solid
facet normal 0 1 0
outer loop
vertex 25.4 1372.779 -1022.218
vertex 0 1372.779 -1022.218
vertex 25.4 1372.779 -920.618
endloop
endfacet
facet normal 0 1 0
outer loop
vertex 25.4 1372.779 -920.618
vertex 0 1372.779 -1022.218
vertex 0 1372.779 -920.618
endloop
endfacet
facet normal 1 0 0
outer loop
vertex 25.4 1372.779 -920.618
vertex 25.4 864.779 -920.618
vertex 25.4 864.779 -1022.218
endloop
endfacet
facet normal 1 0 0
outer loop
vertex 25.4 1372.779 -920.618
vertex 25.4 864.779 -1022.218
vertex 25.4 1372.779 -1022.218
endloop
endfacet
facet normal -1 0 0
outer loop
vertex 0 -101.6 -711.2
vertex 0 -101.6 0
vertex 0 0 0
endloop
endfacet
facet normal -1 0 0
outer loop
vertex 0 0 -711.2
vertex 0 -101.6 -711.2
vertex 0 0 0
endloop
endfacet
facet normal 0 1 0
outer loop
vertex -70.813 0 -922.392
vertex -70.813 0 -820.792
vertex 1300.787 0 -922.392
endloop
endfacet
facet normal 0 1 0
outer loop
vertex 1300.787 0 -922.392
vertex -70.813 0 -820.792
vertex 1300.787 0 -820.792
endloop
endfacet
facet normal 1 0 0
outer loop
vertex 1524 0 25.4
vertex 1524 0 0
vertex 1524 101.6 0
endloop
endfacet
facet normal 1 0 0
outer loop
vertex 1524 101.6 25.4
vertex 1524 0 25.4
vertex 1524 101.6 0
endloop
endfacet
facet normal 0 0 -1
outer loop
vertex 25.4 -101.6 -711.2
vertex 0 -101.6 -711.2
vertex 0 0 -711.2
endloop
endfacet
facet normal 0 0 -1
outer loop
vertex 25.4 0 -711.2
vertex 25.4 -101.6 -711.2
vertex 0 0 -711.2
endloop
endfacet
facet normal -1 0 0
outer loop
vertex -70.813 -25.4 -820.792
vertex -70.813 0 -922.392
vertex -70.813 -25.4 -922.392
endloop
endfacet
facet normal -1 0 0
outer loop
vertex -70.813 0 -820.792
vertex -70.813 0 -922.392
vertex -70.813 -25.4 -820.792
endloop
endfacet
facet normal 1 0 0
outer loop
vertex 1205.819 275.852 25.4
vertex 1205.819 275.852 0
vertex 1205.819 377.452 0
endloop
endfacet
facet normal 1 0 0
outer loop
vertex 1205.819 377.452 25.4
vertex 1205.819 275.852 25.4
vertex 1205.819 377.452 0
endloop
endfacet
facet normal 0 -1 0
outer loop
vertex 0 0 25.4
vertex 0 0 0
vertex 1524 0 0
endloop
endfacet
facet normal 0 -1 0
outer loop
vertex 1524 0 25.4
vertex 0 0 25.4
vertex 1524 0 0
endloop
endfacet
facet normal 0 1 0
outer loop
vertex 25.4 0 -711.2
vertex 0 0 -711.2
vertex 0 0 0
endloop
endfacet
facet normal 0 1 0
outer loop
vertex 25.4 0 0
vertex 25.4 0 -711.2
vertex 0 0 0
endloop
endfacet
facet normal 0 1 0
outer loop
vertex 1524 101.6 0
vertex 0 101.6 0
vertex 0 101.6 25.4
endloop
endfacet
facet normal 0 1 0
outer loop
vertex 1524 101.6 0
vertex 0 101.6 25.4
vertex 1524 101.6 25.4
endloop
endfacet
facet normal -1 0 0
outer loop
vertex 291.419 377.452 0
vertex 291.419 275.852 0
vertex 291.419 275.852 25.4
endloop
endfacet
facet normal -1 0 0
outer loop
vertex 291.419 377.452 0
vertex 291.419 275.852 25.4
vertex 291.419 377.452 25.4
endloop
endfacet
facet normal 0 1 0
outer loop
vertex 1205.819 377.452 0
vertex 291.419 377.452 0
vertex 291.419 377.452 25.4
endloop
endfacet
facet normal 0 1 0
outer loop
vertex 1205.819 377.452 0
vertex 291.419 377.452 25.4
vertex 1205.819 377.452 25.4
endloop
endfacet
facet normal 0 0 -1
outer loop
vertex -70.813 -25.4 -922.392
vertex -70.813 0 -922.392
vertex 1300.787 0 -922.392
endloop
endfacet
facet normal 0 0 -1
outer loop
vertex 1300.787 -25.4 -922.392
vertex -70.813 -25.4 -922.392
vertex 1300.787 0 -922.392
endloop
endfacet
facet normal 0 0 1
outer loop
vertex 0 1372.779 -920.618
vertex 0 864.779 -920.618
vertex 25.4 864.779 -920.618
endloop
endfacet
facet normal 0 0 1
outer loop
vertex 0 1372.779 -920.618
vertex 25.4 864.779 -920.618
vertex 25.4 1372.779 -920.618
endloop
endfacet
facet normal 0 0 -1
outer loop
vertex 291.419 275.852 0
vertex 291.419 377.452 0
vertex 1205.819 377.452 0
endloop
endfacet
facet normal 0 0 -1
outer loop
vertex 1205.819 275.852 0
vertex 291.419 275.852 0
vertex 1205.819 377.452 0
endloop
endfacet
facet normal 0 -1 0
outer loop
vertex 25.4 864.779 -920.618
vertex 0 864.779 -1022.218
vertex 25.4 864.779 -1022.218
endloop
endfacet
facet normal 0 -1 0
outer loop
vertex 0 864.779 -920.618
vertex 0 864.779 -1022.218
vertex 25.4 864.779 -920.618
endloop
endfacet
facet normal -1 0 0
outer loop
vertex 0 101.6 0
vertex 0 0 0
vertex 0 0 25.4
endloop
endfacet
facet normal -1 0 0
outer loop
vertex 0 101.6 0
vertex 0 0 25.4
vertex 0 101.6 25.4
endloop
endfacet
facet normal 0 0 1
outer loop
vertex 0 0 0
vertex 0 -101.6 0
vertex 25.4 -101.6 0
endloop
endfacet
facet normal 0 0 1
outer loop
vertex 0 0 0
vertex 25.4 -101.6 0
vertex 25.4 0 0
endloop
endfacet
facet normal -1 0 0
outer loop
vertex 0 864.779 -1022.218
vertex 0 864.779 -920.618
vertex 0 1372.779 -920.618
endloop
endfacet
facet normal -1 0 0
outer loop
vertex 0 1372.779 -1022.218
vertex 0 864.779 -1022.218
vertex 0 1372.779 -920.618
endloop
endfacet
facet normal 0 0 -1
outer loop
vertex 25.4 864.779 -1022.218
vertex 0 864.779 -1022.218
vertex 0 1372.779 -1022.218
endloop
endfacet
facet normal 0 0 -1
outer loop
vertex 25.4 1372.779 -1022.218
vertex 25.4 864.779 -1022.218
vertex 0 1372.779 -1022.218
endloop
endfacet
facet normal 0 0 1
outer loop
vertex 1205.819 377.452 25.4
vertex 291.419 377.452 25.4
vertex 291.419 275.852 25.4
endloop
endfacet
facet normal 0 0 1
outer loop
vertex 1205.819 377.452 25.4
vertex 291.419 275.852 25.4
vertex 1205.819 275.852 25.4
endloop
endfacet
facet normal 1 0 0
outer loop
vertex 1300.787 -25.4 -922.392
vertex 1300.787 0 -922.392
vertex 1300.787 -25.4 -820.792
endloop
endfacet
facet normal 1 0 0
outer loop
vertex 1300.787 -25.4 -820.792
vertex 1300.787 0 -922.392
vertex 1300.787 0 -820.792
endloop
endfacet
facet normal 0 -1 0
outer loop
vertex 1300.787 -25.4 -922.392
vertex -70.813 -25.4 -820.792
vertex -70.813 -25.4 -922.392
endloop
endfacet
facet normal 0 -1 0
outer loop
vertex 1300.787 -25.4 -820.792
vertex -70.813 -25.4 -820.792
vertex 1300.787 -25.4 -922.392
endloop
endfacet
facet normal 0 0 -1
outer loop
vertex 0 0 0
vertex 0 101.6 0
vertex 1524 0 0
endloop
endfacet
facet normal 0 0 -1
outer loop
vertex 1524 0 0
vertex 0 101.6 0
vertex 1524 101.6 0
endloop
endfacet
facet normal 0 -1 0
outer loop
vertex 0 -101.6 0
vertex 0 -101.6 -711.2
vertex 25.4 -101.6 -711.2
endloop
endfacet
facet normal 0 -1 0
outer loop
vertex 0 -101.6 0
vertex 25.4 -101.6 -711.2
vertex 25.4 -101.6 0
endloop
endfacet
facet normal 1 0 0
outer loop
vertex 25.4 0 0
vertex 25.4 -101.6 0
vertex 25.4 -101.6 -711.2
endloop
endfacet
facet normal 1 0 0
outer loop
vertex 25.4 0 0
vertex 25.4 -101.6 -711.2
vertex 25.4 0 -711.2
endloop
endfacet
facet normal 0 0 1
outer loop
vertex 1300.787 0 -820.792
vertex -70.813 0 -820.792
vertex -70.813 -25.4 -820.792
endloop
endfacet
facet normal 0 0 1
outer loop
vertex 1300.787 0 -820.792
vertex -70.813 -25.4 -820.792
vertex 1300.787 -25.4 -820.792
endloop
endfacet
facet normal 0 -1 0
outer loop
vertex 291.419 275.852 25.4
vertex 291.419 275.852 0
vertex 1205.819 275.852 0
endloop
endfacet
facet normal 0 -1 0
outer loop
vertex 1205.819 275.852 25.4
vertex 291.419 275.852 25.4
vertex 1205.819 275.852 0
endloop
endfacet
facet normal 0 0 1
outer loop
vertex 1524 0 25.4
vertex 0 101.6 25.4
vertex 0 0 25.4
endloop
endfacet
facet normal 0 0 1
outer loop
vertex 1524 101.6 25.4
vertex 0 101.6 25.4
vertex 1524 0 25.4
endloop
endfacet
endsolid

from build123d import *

# Parameters (mm, degrees)
F0_W     = 1524
F0_H     = 101.6
F1_DEPTH = 25.4
F2_W     = 101.6
F2_H     = 711.2
F3_DEPTH = 25.4
F4_W     = 914.4
F4_H     = 101.6
F5_DEPTH = 25.4
F6_W     = 508
F6_H     = 101.6
F7_DEPTH = 25.4
F8_W     = 1371.6
F8_H     = 101.6
F9_DEPTH = 25.4


with BuildPart() as f1:
    # F0 (on Top) → F1 (new body)
    with BuildSketch(Plane.XY):
        with Locations((762, 50.8)):
            Rectangle(F0_W, F0_H)
    extrude(amount=F1_DEPTH)


with BuildPart() as f3:
    # F2 (on Right) → F3 (new body)
    with BuildSketch(Plane.YZ):
        with Locations((-50.8, -355.6)):
            Rectangle(F2_W, F2_H)
    extrude(amount=F3_DEPTH)


with BuildPart() as f5:
    # F4 (on Top) → F5 (new body)
    with BuildSketch(Plane.XY):
        with Locations((748.619171, 326.652107)):
            Rectangle(F4_W, F4_H)
    extrude(amount=F5_DEPTH)


with BuildPart() as f7:
    # F6 (on Right) → F7 (new body)
    with BuildSketch(Plane.YZ):
        with Locations((1118.779244, -971.418232)):
            Rectangle(F6_W, F6_H)
    extrude(amount=F7_DEPTH)


with BuildPart() as f9:
    # F8 (on Front) → F9 (new body)
    with BuildSketch(Plane.XZ):
        with Locations((614.986509, -871.591932)):
            Rectangle(F8_W, F8_H)
    extrude(amount=F9_DEPTH)


solid = Compound([f1.part, f3.part, f5.part, f7.part, f9.part])
